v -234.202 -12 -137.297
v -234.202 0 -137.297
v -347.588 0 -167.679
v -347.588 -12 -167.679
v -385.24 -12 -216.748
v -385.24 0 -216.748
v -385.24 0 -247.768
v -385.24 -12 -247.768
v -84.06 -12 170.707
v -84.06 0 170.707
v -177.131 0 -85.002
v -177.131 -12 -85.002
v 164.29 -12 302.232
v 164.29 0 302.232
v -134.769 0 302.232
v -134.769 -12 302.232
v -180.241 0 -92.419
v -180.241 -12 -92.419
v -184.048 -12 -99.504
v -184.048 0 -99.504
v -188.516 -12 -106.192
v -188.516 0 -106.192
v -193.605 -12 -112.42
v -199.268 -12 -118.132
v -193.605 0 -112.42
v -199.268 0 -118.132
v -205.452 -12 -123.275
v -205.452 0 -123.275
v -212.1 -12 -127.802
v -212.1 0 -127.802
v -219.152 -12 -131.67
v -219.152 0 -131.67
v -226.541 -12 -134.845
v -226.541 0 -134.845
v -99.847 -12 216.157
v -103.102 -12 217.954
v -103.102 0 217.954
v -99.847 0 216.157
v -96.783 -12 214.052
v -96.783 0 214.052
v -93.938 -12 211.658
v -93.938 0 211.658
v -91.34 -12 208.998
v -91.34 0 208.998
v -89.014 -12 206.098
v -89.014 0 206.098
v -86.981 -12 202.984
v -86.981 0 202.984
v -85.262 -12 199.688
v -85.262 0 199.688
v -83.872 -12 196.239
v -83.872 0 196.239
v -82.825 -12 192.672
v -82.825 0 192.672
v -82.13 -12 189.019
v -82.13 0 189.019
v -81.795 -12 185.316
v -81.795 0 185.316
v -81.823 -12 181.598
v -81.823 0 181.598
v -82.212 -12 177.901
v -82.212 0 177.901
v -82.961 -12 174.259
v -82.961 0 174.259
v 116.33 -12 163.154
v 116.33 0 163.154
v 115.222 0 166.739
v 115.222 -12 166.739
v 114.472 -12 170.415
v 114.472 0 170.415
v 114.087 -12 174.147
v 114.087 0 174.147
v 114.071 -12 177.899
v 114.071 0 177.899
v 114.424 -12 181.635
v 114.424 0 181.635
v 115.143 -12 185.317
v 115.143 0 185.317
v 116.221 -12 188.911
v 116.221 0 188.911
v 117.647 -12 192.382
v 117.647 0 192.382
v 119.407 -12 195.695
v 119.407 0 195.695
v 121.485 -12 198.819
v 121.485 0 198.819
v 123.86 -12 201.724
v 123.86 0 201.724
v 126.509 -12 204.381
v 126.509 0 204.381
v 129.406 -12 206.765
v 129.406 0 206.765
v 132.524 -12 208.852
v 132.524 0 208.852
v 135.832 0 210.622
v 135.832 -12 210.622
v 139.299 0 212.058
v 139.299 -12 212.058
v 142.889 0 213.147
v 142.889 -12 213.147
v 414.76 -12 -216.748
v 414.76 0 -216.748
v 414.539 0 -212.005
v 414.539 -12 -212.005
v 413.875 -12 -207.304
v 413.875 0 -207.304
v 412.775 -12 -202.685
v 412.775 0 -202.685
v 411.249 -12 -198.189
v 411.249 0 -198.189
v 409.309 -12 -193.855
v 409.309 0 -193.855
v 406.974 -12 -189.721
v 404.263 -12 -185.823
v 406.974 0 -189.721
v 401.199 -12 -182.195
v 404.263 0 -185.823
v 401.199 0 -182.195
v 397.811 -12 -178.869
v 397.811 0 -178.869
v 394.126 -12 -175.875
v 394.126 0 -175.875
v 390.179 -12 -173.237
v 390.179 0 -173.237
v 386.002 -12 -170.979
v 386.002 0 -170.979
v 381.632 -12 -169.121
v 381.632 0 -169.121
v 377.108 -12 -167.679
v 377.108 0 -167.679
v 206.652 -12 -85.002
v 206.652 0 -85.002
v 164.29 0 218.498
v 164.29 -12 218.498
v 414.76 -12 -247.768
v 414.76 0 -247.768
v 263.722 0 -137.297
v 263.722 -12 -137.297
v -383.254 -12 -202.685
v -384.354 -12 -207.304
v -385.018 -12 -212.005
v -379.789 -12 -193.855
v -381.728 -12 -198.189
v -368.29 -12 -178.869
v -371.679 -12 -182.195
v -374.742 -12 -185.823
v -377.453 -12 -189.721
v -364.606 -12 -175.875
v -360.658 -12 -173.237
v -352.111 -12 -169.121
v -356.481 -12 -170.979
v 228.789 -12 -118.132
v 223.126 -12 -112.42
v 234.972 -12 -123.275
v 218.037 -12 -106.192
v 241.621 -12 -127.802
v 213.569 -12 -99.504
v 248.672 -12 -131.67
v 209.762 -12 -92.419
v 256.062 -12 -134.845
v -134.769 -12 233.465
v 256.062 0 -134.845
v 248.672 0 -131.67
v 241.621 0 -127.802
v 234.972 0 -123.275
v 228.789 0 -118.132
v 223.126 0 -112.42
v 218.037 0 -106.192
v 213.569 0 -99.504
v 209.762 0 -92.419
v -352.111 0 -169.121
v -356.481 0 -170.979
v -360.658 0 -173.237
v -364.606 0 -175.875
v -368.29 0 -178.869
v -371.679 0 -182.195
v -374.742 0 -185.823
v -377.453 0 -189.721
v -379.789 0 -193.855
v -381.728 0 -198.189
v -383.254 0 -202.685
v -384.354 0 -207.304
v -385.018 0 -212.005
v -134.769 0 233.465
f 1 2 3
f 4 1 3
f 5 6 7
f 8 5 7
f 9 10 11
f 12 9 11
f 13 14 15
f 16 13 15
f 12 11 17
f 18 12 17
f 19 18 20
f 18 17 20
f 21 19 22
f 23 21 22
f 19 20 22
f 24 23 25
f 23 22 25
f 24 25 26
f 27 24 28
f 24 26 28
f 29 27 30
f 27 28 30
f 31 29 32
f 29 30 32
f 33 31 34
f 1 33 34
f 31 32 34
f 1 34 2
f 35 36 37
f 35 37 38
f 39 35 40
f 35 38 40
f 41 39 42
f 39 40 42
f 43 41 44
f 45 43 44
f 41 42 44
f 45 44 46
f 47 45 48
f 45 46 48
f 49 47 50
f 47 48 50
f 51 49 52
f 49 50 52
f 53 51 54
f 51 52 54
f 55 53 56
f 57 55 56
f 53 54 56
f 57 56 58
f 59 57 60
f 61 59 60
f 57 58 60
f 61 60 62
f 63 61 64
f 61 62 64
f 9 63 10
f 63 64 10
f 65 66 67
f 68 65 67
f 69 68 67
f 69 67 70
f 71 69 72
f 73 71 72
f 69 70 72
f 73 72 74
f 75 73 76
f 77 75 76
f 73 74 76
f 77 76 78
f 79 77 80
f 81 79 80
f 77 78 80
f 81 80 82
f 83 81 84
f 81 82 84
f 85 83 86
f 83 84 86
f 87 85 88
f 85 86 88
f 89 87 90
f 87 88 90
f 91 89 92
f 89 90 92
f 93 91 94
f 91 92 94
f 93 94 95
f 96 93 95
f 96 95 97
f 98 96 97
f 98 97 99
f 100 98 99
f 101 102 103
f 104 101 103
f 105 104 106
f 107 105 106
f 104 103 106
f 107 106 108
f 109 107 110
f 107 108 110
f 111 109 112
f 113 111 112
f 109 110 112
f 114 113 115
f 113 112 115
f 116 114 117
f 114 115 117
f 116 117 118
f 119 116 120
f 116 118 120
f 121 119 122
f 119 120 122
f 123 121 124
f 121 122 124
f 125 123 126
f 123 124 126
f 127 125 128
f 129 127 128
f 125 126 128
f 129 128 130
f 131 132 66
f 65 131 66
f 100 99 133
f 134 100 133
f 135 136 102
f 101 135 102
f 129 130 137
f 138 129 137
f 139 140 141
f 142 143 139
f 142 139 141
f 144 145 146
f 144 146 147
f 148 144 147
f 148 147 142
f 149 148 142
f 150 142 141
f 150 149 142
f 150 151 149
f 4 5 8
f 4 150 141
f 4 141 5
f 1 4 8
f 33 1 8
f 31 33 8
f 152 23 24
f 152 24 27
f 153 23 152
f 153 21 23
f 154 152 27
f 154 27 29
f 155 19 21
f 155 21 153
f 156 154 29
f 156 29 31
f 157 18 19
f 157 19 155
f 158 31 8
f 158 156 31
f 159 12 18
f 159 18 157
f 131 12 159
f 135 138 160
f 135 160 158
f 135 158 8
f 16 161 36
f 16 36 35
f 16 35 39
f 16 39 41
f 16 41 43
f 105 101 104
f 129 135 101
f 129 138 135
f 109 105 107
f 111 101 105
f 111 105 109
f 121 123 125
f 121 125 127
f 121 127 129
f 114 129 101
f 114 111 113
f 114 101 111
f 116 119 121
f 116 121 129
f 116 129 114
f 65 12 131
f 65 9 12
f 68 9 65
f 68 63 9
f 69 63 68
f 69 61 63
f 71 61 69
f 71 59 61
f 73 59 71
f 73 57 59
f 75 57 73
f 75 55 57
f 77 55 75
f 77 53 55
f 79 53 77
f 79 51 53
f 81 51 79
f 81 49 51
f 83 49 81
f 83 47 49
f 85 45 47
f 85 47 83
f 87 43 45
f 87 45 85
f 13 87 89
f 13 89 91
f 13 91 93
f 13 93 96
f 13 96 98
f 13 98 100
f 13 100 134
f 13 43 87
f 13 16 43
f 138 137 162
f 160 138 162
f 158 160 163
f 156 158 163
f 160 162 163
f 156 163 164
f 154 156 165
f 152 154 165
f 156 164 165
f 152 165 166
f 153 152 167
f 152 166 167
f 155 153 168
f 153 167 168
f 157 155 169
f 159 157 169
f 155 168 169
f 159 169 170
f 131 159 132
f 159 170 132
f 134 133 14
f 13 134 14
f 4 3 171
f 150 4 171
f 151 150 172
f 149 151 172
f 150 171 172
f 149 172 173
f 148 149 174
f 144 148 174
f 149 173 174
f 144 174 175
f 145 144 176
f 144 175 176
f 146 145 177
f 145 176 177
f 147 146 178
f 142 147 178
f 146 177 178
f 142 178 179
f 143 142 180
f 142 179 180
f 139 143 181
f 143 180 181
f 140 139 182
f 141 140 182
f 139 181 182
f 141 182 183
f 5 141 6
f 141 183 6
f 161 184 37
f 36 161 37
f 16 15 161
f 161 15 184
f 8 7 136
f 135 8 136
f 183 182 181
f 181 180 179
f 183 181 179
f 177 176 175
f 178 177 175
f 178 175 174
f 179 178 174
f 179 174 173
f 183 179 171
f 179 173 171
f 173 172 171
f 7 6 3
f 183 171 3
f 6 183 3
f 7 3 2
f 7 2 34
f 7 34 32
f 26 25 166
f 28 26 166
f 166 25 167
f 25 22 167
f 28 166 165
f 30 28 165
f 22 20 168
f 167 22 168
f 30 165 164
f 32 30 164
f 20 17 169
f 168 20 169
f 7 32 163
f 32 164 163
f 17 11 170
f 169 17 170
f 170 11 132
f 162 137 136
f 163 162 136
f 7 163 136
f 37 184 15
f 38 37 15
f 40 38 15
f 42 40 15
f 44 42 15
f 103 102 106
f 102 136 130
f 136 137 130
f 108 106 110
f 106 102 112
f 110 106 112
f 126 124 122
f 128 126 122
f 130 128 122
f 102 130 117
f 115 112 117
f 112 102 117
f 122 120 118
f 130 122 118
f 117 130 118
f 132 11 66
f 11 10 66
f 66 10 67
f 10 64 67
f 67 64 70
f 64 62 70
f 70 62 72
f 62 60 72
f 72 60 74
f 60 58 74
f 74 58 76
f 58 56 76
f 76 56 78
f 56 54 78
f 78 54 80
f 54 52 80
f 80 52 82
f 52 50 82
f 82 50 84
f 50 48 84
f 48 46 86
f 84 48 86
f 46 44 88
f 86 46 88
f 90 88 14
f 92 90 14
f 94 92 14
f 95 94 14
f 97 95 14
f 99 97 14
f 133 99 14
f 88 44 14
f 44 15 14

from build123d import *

# Parameters (mm, degrees)
F1_DEPTH = 12


with BuildPart() as f1:
    # F0 (on Front) → F1 (new body)
    with BuildSketch(Plane.XZ):
        with BuildLine():
            Line((-385.239591, -216.748114), (-385.239591, -247.767903))
            Line((-385.239591, -247.767903), (414.760409, -247.767903))
            Line((414.760409, -247.767903), (414.760409, -216.748114))
            ThreePointArc((414.760409, -216.748114), (404.262759, -185.823034), (377.108417, -167.679082))
            Line((377.108417, -167.679082), (263.722384, -137.297386))
            ThreePointArc((263.722384, -137.297386), (228.788625, -118.13207), (206.651561, -85.001612))
            Line((206.651561, -85.001612), (116.330324, 163.153948))
            ThreePointArc((116.330324, 163.153948), (118.486024, 194.059957), (142.889403, 213.146694))
            Line((142.889403, 213.146694), (164.289631, 218.498353))
            Line((164.289631, 218.498353), (164.289631, 302.232097))
            Line((164.289631, 302.232097), (-134.768812, 302.232097))
            Line((-134.768812, 302.232097), (-134.768812, 233.465457))
            Line((-134.768812, 233.465457), (-103.102214, 217.953577))
            ThreePointArc((-103.102214, 217.953577), (-84.524765, 197.980438), (-84.060364, 170.70715))
            Line((-84.060364, 170.70715), (-177.130742, -85.001612))
            ThreePointArc((-177.130742, -85.001612), (-199.267807, -118.13207), (-234.201565, -137.297386))
            Line((-234.201565, -137.297386), (-347.587598, -167.679082))
            ThreePointArc((-347.587598, -167.679082), (-374.74194, -185.823034), (-385.239591, -216.748114))
        make_face()
    extrude(amount=F1_DEPTH)


solid = f1.part
